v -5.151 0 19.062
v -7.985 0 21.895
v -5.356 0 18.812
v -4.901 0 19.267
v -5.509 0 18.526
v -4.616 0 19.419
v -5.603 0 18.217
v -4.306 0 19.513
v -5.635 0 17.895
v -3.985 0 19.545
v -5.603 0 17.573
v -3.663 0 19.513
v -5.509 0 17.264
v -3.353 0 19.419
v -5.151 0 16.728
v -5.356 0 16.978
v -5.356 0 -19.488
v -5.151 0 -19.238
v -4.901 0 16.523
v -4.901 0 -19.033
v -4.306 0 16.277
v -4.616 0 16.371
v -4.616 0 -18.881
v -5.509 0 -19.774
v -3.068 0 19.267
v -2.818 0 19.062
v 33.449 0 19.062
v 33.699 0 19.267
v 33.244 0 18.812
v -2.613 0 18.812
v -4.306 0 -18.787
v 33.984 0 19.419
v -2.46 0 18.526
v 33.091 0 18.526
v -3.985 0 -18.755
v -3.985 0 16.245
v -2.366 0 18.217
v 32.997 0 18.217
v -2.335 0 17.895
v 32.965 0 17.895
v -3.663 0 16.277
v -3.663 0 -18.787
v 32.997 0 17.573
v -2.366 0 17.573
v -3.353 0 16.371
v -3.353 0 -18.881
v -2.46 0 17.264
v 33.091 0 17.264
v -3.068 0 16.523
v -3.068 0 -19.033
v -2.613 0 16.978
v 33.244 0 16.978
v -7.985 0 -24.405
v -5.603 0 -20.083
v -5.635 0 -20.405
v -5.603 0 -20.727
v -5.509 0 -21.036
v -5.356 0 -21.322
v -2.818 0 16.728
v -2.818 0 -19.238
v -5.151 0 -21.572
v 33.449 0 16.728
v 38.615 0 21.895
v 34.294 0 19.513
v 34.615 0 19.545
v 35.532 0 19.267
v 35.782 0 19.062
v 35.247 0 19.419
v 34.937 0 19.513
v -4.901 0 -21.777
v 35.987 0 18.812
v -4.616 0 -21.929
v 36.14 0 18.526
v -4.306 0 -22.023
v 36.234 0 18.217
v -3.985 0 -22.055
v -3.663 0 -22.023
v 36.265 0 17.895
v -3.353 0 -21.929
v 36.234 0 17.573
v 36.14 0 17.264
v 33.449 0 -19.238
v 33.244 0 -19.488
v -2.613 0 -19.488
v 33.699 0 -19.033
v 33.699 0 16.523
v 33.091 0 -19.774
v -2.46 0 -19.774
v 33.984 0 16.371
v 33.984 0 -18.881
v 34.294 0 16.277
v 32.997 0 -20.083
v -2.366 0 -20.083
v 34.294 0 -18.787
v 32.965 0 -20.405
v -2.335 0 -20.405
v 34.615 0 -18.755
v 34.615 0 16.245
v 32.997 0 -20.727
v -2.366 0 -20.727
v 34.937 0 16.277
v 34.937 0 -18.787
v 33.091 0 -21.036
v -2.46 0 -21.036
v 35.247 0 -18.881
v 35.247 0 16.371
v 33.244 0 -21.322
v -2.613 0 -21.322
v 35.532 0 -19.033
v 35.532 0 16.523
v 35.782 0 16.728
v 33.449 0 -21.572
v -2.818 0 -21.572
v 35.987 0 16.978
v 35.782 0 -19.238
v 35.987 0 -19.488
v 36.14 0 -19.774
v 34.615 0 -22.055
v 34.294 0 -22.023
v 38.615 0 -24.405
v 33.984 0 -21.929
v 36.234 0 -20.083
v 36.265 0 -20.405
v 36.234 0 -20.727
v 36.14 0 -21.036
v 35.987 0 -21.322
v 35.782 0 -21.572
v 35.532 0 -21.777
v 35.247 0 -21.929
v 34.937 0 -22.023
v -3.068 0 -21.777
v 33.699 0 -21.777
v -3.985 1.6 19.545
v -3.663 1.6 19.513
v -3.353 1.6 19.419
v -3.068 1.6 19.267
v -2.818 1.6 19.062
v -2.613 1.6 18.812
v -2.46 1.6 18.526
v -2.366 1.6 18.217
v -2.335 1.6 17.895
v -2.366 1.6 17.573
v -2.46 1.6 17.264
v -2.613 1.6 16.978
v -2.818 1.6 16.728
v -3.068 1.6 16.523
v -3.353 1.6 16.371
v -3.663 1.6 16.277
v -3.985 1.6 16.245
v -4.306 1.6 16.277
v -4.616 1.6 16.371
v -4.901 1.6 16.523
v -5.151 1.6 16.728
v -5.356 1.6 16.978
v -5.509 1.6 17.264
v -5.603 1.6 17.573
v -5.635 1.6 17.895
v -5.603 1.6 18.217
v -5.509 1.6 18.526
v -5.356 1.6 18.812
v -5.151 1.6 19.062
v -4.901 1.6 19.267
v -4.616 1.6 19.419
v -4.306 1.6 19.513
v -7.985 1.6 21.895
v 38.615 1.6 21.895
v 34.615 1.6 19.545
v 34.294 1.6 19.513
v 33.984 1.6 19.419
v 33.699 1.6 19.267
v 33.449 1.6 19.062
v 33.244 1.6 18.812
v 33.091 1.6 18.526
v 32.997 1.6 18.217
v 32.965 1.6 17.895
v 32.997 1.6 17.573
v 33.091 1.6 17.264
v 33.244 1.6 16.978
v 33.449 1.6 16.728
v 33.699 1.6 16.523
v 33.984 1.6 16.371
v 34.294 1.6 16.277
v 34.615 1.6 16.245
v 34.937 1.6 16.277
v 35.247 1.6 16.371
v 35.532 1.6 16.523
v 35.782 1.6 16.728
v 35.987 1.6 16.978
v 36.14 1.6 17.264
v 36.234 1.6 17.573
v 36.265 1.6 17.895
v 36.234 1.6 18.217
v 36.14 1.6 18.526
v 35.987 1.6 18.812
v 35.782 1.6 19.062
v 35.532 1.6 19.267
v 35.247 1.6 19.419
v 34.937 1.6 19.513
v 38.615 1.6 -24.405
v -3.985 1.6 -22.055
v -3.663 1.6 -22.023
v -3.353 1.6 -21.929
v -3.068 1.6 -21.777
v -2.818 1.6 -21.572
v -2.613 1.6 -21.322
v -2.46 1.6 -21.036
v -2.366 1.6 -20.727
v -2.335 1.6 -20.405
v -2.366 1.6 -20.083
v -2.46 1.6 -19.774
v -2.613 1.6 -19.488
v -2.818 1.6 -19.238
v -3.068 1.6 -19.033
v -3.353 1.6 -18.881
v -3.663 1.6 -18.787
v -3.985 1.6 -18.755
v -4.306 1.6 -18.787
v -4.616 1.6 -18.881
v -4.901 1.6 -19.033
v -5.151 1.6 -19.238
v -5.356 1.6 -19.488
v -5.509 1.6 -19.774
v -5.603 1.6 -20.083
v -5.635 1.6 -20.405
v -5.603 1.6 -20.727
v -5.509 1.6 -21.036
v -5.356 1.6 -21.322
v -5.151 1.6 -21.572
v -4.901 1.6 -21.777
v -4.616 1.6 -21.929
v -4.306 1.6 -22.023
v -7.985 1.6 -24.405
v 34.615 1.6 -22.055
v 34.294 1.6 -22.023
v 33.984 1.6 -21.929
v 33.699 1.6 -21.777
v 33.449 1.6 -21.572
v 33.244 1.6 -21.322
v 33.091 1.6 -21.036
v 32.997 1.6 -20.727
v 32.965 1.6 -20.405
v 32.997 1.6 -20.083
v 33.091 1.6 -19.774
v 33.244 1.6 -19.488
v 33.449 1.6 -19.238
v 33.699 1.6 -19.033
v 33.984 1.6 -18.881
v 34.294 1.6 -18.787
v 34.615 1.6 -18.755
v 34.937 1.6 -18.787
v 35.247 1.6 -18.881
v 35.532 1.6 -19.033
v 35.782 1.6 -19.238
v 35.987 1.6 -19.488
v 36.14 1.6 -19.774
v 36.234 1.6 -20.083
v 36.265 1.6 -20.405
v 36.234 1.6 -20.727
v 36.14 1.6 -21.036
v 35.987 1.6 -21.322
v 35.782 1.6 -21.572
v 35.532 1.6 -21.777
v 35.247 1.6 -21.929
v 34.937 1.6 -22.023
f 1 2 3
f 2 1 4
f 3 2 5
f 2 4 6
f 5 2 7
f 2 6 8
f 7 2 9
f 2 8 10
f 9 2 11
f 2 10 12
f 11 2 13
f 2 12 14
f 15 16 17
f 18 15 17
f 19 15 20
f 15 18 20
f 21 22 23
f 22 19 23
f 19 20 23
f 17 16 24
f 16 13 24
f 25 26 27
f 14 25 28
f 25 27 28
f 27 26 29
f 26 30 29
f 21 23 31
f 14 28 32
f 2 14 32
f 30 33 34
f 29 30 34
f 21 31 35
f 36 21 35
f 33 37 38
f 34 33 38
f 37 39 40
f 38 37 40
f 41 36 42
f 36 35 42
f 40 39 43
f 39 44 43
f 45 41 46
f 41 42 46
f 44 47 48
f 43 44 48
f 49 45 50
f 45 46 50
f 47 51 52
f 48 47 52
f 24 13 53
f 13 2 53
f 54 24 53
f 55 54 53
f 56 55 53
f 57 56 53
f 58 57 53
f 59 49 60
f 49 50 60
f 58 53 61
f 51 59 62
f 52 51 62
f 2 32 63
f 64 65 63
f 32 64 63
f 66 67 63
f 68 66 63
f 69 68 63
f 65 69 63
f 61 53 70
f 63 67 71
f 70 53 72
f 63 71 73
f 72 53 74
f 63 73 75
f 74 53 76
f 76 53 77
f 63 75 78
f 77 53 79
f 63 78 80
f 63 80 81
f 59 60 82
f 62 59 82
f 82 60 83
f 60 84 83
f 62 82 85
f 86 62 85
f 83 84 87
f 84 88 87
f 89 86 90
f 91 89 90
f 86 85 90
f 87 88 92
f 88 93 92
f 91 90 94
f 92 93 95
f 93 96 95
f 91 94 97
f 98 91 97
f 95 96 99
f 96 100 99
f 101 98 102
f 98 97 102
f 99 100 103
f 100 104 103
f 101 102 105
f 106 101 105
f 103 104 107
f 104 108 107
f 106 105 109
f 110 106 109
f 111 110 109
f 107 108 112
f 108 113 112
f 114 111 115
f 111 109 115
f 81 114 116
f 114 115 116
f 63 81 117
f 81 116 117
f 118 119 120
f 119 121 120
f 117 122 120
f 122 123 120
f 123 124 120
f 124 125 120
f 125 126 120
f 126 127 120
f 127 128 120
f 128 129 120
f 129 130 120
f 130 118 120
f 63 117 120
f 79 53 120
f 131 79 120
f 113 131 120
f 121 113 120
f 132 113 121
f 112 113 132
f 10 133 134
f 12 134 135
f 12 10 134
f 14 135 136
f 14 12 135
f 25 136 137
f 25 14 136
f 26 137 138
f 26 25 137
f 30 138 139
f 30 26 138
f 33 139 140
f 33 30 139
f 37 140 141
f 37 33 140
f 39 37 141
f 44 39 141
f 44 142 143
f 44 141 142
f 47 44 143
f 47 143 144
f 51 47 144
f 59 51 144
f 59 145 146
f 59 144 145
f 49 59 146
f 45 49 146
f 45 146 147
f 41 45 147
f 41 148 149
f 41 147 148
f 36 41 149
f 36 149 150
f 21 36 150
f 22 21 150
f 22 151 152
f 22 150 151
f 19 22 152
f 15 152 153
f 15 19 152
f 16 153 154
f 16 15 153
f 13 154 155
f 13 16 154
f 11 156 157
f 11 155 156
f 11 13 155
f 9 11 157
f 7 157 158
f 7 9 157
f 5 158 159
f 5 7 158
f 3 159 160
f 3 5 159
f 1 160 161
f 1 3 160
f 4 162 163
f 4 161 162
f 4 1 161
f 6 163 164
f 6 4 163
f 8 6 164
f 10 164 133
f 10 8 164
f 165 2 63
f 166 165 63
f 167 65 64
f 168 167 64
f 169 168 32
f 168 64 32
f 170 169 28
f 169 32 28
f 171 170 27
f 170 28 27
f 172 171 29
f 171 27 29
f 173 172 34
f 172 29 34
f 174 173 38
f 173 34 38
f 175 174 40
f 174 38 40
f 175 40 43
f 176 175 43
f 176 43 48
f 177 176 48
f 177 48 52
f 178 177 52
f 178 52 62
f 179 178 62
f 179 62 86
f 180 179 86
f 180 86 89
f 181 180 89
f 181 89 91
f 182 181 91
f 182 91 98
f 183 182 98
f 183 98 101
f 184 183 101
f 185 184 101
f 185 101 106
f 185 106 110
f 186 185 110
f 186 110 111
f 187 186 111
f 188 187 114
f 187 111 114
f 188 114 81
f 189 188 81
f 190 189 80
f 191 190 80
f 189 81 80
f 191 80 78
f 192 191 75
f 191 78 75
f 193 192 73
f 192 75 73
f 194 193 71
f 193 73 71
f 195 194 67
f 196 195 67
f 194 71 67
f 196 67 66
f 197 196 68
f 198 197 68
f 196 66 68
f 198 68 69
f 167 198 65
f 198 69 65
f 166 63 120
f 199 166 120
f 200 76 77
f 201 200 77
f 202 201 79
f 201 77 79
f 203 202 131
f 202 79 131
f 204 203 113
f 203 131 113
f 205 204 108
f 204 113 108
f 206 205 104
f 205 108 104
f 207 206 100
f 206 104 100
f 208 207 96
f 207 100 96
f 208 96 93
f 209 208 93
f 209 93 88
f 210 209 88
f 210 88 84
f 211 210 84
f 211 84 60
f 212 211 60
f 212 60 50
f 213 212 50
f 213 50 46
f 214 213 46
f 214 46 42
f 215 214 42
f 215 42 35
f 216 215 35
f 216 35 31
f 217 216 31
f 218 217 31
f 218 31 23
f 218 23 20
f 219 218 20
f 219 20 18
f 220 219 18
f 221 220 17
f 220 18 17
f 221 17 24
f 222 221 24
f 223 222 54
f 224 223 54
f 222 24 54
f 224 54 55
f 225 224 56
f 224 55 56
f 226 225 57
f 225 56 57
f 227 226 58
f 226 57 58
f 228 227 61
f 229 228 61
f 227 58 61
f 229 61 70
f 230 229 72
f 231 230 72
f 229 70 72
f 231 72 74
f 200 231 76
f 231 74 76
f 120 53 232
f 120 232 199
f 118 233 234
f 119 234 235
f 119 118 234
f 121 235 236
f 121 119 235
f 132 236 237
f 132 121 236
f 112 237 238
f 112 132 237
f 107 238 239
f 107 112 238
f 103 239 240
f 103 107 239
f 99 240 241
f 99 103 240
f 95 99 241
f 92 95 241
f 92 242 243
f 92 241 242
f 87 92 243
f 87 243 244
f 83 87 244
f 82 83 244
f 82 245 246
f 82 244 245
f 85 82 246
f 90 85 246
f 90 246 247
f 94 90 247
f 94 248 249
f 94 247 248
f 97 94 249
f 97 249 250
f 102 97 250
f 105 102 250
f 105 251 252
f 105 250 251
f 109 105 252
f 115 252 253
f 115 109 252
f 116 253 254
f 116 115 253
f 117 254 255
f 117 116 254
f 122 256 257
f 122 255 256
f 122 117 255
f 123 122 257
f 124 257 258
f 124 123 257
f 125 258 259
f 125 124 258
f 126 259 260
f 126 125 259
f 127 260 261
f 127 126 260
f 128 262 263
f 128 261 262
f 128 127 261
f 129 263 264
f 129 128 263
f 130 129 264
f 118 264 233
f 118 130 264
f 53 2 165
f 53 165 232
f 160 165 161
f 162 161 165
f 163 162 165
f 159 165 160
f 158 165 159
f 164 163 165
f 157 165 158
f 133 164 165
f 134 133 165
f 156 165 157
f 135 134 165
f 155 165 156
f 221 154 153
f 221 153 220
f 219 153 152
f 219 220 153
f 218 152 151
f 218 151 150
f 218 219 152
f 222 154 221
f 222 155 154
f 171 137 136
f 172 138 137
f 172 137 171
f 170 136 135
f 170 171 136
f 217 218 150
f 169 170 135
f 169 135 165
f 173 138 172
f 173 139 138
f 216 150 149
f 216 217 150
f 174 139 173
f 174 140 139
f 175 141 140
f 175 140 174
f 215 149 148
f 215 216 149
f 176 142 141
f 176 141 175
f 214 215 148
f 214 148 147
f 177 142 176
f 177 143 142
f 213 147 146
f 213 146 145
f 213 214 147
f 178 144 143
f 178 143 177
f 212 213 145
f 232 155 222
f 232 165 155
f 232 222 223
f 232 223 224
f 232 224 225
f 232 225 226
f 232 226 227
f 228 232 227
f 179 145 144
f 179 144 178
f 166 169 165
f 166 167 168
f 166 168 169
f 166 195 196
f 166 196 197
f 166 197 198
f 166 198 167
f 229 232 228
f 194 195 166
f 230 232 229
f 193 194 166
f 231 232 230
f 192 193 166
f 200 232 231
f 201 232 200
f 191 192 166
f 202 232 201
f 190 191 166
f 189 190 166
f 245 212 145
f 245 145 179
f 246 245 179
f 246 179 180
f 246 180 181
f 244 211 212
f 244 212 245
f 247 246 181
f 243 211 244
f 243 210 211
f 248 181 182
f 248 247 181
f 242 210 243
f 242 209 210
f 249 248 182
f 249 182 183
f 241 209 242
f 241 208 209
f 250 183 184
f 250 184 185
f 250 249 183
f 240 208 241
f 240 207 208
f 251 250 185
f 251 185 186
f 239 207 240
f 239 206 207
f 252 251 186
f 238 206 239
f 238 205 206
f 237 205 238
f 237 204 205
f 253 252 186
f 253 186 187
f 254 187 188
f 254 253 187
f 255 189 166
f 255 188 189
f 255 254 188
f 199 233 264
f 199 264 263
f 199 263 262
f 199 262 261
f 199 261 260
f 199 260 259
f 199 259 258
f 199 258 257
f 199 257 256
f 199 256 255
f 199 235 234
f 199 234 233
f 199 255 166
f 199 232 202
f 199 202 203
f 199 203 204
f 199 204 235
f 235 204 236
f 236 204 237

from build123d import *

# Parameters (mm, degrees)
SKETCH1_W               = 46.6
SKETCH1_H               = 46.3
BOSS_EXTRUDE1_DEPTH     = 1.6
SKETCH2_R               = 1.65
CUT_EXTRUDE1_DEPTH      = 46.709051233
MIRROR3_COPY_1_SKETCH_R = 1.65
MIRROR3_COPY_1_DEPTH    = 46.709051233


with BuildPart() as part:
    # Sketch1 → Boss-Extrude1 (new body)
    with BuildSketch(Plane(origin=(0, 0, 0), x_dir=(1, 0, 0), z_dir=(0, 1, 0))):
        with Locations((15.315469417, 1.254976672)):
            Rectangle(SKETCH1_W, SKETCH1_H)
    extrude(amount=BOSS_EXTRUDE1_DEPTH)

    # Sketch2 → Cut-Extrude1 (cut, through all)
    with BuildSketch(Plane.XZ):
        with Locations(Location((-3.984530583, -20.404976672, 0), (0, 0, 270))):
            Circle(SKETCH2_R)
    cut_extrude1 = extrude(amount=-CUT_EXTRUDE1_DEPTH, mode=Mode.SUBTRACT)

    # Mirror1: Cut-Extrude1 across plane
    add(cut_extrude1.mirror(Plane(origin=(15.315469417, 0, 0), x_dir=(0, 0, 1), z_dir=(1, 0, 0))), mode=Mode.SUBTRACT)

    # Mirror3: Cut-Extrude1 across plane
    add(cut_extrude1.mirror(Plane(origin=(0, 0, -1.254976672), x_dir=(1, 0, 0), z_dir=(0, 0, -1))), mode=Mode.SUBTRACT)

    # Mirror3 copy 1 sketch → Mirror3 copy 1 (cut, through all)
    with BuildSketch(Plane(origin=(30.630938834, 0, -2.509953343), x_dir=(-1, 0, 0), z_dir=(0, -1, 0))):
        with Locations(Location((-3.984530583, -20.404976672, 0), (0, 0, 270))):
            Circle(MIRROR3_COPY_1_SKETCH_R)
    extrude(amount=-MIRROR3_COPY_1_DEPTH, mode=Mode.SUBTRACT)


solid = part.part
